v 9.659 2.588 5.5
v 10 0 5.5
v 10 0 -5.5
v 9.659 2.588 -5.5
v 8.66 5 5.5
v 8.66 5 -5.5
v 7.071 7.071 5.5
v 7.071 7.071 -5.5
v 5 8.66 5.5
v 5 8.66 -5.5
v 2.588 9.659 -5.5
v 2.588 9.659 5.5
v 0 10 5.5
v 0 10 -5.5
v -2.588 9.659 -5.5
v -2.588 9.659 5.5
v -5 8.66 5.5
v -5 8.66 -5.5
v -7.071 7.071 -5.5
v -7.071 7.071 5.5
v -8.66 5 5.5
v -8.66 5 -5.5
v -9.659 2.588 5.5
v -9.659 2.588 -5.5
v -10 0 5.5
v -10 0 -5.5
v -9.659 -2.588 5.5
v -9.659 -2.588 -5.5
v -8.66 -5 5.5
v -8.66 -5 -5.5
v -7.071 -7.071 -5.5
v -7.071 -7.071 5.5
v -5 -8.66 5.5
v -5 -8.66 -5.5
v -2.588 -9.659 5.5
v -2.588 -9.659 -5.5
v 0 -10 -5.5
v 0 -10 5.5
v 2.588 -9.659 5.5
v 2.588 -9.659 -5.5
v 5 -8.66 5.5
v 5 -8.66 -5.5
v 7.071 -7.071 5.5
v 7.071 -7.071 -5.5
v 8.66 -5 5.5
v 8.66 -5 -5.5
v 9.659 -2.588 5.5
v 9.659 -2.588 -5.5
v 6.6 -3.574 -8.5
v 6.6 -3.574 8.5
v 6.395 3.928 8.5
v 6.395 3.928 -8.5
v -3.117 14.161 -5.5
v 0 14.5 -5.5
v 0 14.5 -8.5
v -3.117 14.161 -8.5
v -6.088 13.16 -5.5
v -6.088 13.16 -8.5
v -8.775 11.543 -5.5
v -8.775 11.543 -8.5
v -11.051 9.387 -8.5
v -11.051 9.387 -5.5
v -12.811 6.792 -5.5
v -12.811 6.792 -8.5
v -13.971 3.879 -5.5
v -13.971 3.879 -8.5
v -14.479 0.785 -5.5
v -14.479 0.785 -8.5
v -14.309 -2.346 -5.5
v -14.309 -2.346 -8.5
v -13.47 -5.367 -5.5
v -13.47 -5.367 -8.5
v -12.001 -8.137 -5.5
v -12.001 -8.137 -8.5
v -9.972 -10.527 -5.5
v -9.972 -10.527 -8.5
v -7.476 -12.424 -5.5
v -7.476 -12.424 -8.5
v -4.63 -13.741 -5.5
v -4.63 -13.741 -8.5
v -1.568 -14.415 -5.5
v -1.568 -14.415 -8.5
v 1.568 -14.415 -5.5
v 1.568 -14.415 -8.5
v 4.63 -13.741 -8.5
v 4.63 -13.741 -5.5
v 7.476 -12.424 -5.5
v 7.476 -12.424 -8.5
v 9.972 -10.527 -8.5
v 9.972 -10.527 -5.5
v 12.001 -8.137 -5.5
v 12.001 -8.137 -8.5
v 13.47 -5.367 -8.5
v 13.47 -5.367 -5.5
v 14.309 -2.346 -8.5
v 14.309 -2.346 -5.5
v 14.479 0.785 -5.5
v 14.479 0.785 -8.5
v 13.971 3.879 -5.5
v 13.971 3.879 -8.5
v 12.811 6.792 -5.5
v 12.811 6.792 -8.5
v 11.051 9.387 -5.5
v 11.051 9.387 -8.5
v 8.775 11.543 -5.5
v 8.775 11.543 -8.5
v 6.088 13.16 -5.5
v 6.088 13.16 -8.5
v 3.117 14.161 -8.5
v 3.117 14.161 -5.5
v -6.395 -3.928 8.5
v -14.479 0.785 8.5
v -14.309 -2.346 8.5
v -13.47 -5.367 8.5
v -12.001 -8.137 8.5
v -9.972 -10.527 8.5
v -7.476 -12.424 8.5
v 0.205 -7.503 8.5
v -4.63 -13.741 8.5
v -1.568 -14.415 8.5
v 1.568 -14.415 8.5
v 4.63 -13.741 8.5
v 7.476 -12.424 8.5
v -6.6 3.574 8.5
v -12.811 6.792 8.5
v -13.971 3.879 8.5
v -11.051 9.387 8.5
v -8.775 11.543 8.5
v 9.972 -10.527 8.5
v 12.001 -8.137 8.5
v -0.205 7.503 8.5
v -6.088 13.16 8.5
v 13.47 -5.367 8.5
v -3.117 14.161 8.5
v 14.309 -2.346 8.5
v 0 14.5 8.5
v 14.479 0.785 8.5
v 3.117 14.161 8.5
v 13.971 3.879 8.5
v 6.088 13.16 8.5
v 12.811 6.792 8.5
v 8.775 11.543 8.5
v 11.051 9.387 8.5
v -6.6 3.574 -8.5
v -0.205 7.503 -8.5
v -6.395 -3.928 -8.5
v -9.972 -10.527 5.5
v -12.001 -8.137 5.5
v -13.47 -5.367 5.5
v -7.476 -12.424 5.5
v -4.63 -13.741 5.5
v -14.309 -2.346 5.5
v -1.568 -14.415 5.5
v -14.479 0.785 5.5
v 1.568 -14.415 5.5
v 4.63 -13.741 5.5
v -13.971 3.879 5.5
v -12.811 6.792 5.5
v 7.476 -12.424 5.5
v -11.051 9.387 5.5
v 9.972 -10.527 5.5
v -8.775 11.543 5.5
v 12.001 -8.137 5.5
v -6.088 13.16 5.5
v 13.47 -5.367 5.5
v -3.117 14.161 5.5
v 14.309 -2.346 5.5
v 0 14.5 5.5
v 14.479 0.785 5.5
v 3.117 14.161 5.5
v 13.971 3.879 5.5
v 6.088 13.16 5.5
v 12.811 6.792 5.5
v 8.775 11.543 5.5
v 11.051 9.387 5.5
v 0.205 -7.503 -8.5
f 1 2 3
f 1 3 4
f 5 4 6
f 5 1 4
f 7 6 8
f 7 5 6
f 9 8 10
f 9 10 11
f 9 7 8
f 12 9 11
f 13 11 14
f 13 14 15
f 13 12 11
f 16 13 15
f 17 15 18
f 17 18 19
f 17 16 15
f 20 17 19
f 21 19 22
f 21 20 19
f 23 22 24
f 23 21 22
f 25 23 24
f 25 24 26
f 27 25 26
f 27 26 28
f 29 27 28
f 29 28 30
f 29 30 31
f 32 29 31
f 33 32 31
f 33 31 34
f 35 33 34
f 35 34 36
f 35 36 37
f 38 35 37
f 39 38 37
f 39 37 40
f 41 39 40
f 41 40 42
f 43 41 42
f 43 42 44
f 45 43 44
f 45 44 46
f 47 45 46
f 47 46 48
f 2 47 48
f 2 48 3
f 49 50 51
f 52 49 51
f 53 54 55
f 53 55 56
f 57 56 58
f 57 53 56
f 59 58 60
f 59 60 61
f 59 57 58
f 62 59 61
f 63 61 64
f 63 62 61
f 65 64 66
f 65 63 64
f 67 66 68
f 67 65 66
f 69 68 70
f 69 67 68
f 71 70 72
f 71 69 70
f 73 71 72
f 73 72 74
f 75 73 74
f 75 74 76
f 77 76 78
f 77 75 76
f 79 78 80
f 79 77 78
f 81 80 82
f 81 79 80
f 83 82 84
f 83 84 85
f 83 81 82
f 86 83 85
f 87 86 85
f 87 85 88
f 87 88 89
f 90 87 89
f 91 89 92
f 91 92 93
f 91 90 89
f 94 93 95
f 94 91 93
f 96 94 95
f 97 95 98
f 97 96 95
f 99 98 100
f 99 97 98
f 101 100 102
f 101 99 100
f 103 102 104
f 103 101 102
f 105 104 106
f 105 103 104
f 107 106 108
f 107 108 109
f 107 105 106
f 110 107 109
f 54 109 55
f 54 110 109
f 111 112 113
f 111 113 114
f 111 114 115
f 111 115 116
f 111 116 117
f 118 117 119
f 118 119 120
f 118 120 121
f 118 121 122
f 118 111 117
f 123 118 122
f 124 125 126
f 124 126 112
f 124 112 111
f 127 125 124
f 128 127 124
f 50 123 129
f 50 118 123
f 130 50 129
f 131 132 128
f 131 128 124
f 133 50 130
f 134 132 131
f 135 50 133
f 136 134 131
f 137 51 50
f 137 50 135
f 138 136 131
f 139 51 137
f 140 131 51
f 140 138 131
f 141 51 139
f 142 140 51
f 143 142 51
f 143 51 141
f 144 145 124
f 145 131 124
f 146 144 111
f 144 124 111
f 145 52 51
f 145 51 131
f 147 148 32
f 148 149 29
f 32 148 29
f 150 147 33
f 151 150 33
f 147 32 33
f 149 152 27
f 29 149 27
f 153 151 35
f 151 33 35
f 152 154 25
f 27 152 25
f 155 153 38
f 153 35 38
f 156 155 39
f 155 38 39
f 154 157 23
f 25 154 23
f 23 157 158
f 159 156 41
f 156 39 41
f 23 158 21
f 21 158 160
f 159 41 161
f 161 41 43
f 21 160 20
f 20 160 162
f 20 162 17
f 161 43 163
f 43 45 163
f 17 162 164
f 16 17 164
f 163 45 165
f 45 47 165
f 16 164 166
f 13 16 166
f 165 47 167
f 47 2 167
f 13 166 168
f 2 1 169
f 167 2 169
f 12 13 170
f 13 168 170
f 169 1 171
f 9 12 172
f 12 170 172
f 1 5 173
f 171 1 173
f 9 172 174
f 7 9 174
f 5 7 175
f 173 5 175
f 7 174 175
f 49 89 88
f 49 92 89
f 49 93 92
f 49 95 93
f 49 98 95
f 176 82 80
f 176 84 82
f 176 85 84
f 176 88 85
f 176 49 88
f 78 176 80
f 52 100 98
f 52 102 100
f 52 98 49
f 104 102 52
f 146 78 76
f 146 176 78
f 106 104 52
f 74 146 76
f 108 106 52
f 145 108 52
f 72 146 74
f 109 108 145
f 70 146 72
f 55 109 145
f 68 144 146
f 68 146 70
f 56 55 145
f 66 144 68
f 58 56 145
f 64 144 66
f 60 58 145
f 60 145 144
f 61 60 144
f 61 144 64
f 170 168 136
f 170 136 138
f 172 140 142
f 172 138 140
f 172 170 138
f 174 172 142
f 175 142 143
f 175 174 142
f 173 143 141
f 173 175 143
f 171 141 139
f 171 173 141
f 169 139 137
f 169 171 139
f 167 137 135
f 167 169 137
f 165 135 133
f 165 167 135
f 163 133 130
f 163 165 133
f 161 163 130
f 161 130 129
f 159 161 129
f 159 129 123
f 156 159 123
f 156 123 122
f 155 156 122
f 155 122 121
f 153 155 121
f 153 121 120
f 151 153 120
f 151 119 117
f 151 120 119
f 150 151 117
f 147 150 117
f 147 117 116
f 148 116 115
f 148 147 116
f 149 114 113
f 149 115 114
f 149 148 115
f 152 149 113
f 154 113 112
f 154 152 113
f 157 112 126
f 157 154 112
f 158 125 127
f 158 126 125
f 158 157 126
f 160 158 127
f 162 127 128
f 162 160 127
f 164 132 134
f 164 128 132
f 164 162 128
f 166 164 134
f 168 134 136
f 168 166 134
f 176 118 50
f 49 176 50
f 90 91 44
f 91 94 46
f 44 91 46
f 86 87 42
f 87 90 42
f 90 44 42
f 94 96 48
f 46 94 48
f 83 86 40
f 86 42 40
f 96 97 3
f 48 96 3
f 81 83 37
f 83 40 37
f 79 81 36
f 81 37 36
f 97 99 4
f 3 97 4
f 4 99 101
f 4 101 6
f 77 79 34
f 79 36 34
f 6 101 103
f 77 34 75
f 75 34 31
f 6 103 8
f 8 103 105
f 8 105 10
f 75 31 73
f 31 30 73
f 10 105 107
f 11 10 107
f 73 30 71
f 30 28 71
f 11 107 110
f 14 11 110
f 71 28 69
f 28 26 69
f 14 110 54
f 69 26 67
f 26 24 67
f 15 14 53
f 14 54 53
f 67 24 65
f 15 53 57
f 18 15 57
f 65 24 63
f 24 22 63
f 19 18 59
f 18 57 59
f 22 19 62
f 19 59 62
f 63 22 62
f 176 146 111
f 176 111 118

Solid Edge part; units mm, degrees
sketch "Sketch1" plane through (0, 0, 0) normal (0, 0, 1) x (1, 0, 0)
  circle A0 centre (0, 0) radius 10
  dimension "D1" = 20
extrude "Protrusion1" add sketch "Sketch1" along normal mid plane 11
sketch "Sketch2" plane through (0, 0, 5.5) normal (0, 0, 1) x (0, 1, 0)
  circle A0 centre (0, 0) radius 14.5
  dimension "D1" = 29
extrude "ExtrudedProtrusion_2" add sketch "Sketch2" along normal blind 3
mirror "Mirror1" about plane through (0, 0, 0) normal (0, 0, -1) of "ExtrudedProtrusion_2"
sketch "Sketch3" plane through (0, 0, 8.5) normal (0, 0, 1) x (0, -1, 0)
  line L0 (3.9285, -6.3953) -> (7.5028, 0.2046)
  line L1 (7.5028, 0.2046) -> (3.5742, 6.5999)
  line L2 (3.5742, 6.5999) -> (-3.9285, 6.3953)
  line L3 (-3.9285, 6.3953) -> (-7.5028, -0.2046)
  line L4 (-7.5028, -0.2046) -> (-3.5742, -6.5999)
  line L5 (-3.5742, -6.5999) -> (3.9285, -6.3953)
extrude "ExtrudedCutout_1" cut sketch "Sketch3" against normal blind 37.5006
properties part number "BumbleB0195"
